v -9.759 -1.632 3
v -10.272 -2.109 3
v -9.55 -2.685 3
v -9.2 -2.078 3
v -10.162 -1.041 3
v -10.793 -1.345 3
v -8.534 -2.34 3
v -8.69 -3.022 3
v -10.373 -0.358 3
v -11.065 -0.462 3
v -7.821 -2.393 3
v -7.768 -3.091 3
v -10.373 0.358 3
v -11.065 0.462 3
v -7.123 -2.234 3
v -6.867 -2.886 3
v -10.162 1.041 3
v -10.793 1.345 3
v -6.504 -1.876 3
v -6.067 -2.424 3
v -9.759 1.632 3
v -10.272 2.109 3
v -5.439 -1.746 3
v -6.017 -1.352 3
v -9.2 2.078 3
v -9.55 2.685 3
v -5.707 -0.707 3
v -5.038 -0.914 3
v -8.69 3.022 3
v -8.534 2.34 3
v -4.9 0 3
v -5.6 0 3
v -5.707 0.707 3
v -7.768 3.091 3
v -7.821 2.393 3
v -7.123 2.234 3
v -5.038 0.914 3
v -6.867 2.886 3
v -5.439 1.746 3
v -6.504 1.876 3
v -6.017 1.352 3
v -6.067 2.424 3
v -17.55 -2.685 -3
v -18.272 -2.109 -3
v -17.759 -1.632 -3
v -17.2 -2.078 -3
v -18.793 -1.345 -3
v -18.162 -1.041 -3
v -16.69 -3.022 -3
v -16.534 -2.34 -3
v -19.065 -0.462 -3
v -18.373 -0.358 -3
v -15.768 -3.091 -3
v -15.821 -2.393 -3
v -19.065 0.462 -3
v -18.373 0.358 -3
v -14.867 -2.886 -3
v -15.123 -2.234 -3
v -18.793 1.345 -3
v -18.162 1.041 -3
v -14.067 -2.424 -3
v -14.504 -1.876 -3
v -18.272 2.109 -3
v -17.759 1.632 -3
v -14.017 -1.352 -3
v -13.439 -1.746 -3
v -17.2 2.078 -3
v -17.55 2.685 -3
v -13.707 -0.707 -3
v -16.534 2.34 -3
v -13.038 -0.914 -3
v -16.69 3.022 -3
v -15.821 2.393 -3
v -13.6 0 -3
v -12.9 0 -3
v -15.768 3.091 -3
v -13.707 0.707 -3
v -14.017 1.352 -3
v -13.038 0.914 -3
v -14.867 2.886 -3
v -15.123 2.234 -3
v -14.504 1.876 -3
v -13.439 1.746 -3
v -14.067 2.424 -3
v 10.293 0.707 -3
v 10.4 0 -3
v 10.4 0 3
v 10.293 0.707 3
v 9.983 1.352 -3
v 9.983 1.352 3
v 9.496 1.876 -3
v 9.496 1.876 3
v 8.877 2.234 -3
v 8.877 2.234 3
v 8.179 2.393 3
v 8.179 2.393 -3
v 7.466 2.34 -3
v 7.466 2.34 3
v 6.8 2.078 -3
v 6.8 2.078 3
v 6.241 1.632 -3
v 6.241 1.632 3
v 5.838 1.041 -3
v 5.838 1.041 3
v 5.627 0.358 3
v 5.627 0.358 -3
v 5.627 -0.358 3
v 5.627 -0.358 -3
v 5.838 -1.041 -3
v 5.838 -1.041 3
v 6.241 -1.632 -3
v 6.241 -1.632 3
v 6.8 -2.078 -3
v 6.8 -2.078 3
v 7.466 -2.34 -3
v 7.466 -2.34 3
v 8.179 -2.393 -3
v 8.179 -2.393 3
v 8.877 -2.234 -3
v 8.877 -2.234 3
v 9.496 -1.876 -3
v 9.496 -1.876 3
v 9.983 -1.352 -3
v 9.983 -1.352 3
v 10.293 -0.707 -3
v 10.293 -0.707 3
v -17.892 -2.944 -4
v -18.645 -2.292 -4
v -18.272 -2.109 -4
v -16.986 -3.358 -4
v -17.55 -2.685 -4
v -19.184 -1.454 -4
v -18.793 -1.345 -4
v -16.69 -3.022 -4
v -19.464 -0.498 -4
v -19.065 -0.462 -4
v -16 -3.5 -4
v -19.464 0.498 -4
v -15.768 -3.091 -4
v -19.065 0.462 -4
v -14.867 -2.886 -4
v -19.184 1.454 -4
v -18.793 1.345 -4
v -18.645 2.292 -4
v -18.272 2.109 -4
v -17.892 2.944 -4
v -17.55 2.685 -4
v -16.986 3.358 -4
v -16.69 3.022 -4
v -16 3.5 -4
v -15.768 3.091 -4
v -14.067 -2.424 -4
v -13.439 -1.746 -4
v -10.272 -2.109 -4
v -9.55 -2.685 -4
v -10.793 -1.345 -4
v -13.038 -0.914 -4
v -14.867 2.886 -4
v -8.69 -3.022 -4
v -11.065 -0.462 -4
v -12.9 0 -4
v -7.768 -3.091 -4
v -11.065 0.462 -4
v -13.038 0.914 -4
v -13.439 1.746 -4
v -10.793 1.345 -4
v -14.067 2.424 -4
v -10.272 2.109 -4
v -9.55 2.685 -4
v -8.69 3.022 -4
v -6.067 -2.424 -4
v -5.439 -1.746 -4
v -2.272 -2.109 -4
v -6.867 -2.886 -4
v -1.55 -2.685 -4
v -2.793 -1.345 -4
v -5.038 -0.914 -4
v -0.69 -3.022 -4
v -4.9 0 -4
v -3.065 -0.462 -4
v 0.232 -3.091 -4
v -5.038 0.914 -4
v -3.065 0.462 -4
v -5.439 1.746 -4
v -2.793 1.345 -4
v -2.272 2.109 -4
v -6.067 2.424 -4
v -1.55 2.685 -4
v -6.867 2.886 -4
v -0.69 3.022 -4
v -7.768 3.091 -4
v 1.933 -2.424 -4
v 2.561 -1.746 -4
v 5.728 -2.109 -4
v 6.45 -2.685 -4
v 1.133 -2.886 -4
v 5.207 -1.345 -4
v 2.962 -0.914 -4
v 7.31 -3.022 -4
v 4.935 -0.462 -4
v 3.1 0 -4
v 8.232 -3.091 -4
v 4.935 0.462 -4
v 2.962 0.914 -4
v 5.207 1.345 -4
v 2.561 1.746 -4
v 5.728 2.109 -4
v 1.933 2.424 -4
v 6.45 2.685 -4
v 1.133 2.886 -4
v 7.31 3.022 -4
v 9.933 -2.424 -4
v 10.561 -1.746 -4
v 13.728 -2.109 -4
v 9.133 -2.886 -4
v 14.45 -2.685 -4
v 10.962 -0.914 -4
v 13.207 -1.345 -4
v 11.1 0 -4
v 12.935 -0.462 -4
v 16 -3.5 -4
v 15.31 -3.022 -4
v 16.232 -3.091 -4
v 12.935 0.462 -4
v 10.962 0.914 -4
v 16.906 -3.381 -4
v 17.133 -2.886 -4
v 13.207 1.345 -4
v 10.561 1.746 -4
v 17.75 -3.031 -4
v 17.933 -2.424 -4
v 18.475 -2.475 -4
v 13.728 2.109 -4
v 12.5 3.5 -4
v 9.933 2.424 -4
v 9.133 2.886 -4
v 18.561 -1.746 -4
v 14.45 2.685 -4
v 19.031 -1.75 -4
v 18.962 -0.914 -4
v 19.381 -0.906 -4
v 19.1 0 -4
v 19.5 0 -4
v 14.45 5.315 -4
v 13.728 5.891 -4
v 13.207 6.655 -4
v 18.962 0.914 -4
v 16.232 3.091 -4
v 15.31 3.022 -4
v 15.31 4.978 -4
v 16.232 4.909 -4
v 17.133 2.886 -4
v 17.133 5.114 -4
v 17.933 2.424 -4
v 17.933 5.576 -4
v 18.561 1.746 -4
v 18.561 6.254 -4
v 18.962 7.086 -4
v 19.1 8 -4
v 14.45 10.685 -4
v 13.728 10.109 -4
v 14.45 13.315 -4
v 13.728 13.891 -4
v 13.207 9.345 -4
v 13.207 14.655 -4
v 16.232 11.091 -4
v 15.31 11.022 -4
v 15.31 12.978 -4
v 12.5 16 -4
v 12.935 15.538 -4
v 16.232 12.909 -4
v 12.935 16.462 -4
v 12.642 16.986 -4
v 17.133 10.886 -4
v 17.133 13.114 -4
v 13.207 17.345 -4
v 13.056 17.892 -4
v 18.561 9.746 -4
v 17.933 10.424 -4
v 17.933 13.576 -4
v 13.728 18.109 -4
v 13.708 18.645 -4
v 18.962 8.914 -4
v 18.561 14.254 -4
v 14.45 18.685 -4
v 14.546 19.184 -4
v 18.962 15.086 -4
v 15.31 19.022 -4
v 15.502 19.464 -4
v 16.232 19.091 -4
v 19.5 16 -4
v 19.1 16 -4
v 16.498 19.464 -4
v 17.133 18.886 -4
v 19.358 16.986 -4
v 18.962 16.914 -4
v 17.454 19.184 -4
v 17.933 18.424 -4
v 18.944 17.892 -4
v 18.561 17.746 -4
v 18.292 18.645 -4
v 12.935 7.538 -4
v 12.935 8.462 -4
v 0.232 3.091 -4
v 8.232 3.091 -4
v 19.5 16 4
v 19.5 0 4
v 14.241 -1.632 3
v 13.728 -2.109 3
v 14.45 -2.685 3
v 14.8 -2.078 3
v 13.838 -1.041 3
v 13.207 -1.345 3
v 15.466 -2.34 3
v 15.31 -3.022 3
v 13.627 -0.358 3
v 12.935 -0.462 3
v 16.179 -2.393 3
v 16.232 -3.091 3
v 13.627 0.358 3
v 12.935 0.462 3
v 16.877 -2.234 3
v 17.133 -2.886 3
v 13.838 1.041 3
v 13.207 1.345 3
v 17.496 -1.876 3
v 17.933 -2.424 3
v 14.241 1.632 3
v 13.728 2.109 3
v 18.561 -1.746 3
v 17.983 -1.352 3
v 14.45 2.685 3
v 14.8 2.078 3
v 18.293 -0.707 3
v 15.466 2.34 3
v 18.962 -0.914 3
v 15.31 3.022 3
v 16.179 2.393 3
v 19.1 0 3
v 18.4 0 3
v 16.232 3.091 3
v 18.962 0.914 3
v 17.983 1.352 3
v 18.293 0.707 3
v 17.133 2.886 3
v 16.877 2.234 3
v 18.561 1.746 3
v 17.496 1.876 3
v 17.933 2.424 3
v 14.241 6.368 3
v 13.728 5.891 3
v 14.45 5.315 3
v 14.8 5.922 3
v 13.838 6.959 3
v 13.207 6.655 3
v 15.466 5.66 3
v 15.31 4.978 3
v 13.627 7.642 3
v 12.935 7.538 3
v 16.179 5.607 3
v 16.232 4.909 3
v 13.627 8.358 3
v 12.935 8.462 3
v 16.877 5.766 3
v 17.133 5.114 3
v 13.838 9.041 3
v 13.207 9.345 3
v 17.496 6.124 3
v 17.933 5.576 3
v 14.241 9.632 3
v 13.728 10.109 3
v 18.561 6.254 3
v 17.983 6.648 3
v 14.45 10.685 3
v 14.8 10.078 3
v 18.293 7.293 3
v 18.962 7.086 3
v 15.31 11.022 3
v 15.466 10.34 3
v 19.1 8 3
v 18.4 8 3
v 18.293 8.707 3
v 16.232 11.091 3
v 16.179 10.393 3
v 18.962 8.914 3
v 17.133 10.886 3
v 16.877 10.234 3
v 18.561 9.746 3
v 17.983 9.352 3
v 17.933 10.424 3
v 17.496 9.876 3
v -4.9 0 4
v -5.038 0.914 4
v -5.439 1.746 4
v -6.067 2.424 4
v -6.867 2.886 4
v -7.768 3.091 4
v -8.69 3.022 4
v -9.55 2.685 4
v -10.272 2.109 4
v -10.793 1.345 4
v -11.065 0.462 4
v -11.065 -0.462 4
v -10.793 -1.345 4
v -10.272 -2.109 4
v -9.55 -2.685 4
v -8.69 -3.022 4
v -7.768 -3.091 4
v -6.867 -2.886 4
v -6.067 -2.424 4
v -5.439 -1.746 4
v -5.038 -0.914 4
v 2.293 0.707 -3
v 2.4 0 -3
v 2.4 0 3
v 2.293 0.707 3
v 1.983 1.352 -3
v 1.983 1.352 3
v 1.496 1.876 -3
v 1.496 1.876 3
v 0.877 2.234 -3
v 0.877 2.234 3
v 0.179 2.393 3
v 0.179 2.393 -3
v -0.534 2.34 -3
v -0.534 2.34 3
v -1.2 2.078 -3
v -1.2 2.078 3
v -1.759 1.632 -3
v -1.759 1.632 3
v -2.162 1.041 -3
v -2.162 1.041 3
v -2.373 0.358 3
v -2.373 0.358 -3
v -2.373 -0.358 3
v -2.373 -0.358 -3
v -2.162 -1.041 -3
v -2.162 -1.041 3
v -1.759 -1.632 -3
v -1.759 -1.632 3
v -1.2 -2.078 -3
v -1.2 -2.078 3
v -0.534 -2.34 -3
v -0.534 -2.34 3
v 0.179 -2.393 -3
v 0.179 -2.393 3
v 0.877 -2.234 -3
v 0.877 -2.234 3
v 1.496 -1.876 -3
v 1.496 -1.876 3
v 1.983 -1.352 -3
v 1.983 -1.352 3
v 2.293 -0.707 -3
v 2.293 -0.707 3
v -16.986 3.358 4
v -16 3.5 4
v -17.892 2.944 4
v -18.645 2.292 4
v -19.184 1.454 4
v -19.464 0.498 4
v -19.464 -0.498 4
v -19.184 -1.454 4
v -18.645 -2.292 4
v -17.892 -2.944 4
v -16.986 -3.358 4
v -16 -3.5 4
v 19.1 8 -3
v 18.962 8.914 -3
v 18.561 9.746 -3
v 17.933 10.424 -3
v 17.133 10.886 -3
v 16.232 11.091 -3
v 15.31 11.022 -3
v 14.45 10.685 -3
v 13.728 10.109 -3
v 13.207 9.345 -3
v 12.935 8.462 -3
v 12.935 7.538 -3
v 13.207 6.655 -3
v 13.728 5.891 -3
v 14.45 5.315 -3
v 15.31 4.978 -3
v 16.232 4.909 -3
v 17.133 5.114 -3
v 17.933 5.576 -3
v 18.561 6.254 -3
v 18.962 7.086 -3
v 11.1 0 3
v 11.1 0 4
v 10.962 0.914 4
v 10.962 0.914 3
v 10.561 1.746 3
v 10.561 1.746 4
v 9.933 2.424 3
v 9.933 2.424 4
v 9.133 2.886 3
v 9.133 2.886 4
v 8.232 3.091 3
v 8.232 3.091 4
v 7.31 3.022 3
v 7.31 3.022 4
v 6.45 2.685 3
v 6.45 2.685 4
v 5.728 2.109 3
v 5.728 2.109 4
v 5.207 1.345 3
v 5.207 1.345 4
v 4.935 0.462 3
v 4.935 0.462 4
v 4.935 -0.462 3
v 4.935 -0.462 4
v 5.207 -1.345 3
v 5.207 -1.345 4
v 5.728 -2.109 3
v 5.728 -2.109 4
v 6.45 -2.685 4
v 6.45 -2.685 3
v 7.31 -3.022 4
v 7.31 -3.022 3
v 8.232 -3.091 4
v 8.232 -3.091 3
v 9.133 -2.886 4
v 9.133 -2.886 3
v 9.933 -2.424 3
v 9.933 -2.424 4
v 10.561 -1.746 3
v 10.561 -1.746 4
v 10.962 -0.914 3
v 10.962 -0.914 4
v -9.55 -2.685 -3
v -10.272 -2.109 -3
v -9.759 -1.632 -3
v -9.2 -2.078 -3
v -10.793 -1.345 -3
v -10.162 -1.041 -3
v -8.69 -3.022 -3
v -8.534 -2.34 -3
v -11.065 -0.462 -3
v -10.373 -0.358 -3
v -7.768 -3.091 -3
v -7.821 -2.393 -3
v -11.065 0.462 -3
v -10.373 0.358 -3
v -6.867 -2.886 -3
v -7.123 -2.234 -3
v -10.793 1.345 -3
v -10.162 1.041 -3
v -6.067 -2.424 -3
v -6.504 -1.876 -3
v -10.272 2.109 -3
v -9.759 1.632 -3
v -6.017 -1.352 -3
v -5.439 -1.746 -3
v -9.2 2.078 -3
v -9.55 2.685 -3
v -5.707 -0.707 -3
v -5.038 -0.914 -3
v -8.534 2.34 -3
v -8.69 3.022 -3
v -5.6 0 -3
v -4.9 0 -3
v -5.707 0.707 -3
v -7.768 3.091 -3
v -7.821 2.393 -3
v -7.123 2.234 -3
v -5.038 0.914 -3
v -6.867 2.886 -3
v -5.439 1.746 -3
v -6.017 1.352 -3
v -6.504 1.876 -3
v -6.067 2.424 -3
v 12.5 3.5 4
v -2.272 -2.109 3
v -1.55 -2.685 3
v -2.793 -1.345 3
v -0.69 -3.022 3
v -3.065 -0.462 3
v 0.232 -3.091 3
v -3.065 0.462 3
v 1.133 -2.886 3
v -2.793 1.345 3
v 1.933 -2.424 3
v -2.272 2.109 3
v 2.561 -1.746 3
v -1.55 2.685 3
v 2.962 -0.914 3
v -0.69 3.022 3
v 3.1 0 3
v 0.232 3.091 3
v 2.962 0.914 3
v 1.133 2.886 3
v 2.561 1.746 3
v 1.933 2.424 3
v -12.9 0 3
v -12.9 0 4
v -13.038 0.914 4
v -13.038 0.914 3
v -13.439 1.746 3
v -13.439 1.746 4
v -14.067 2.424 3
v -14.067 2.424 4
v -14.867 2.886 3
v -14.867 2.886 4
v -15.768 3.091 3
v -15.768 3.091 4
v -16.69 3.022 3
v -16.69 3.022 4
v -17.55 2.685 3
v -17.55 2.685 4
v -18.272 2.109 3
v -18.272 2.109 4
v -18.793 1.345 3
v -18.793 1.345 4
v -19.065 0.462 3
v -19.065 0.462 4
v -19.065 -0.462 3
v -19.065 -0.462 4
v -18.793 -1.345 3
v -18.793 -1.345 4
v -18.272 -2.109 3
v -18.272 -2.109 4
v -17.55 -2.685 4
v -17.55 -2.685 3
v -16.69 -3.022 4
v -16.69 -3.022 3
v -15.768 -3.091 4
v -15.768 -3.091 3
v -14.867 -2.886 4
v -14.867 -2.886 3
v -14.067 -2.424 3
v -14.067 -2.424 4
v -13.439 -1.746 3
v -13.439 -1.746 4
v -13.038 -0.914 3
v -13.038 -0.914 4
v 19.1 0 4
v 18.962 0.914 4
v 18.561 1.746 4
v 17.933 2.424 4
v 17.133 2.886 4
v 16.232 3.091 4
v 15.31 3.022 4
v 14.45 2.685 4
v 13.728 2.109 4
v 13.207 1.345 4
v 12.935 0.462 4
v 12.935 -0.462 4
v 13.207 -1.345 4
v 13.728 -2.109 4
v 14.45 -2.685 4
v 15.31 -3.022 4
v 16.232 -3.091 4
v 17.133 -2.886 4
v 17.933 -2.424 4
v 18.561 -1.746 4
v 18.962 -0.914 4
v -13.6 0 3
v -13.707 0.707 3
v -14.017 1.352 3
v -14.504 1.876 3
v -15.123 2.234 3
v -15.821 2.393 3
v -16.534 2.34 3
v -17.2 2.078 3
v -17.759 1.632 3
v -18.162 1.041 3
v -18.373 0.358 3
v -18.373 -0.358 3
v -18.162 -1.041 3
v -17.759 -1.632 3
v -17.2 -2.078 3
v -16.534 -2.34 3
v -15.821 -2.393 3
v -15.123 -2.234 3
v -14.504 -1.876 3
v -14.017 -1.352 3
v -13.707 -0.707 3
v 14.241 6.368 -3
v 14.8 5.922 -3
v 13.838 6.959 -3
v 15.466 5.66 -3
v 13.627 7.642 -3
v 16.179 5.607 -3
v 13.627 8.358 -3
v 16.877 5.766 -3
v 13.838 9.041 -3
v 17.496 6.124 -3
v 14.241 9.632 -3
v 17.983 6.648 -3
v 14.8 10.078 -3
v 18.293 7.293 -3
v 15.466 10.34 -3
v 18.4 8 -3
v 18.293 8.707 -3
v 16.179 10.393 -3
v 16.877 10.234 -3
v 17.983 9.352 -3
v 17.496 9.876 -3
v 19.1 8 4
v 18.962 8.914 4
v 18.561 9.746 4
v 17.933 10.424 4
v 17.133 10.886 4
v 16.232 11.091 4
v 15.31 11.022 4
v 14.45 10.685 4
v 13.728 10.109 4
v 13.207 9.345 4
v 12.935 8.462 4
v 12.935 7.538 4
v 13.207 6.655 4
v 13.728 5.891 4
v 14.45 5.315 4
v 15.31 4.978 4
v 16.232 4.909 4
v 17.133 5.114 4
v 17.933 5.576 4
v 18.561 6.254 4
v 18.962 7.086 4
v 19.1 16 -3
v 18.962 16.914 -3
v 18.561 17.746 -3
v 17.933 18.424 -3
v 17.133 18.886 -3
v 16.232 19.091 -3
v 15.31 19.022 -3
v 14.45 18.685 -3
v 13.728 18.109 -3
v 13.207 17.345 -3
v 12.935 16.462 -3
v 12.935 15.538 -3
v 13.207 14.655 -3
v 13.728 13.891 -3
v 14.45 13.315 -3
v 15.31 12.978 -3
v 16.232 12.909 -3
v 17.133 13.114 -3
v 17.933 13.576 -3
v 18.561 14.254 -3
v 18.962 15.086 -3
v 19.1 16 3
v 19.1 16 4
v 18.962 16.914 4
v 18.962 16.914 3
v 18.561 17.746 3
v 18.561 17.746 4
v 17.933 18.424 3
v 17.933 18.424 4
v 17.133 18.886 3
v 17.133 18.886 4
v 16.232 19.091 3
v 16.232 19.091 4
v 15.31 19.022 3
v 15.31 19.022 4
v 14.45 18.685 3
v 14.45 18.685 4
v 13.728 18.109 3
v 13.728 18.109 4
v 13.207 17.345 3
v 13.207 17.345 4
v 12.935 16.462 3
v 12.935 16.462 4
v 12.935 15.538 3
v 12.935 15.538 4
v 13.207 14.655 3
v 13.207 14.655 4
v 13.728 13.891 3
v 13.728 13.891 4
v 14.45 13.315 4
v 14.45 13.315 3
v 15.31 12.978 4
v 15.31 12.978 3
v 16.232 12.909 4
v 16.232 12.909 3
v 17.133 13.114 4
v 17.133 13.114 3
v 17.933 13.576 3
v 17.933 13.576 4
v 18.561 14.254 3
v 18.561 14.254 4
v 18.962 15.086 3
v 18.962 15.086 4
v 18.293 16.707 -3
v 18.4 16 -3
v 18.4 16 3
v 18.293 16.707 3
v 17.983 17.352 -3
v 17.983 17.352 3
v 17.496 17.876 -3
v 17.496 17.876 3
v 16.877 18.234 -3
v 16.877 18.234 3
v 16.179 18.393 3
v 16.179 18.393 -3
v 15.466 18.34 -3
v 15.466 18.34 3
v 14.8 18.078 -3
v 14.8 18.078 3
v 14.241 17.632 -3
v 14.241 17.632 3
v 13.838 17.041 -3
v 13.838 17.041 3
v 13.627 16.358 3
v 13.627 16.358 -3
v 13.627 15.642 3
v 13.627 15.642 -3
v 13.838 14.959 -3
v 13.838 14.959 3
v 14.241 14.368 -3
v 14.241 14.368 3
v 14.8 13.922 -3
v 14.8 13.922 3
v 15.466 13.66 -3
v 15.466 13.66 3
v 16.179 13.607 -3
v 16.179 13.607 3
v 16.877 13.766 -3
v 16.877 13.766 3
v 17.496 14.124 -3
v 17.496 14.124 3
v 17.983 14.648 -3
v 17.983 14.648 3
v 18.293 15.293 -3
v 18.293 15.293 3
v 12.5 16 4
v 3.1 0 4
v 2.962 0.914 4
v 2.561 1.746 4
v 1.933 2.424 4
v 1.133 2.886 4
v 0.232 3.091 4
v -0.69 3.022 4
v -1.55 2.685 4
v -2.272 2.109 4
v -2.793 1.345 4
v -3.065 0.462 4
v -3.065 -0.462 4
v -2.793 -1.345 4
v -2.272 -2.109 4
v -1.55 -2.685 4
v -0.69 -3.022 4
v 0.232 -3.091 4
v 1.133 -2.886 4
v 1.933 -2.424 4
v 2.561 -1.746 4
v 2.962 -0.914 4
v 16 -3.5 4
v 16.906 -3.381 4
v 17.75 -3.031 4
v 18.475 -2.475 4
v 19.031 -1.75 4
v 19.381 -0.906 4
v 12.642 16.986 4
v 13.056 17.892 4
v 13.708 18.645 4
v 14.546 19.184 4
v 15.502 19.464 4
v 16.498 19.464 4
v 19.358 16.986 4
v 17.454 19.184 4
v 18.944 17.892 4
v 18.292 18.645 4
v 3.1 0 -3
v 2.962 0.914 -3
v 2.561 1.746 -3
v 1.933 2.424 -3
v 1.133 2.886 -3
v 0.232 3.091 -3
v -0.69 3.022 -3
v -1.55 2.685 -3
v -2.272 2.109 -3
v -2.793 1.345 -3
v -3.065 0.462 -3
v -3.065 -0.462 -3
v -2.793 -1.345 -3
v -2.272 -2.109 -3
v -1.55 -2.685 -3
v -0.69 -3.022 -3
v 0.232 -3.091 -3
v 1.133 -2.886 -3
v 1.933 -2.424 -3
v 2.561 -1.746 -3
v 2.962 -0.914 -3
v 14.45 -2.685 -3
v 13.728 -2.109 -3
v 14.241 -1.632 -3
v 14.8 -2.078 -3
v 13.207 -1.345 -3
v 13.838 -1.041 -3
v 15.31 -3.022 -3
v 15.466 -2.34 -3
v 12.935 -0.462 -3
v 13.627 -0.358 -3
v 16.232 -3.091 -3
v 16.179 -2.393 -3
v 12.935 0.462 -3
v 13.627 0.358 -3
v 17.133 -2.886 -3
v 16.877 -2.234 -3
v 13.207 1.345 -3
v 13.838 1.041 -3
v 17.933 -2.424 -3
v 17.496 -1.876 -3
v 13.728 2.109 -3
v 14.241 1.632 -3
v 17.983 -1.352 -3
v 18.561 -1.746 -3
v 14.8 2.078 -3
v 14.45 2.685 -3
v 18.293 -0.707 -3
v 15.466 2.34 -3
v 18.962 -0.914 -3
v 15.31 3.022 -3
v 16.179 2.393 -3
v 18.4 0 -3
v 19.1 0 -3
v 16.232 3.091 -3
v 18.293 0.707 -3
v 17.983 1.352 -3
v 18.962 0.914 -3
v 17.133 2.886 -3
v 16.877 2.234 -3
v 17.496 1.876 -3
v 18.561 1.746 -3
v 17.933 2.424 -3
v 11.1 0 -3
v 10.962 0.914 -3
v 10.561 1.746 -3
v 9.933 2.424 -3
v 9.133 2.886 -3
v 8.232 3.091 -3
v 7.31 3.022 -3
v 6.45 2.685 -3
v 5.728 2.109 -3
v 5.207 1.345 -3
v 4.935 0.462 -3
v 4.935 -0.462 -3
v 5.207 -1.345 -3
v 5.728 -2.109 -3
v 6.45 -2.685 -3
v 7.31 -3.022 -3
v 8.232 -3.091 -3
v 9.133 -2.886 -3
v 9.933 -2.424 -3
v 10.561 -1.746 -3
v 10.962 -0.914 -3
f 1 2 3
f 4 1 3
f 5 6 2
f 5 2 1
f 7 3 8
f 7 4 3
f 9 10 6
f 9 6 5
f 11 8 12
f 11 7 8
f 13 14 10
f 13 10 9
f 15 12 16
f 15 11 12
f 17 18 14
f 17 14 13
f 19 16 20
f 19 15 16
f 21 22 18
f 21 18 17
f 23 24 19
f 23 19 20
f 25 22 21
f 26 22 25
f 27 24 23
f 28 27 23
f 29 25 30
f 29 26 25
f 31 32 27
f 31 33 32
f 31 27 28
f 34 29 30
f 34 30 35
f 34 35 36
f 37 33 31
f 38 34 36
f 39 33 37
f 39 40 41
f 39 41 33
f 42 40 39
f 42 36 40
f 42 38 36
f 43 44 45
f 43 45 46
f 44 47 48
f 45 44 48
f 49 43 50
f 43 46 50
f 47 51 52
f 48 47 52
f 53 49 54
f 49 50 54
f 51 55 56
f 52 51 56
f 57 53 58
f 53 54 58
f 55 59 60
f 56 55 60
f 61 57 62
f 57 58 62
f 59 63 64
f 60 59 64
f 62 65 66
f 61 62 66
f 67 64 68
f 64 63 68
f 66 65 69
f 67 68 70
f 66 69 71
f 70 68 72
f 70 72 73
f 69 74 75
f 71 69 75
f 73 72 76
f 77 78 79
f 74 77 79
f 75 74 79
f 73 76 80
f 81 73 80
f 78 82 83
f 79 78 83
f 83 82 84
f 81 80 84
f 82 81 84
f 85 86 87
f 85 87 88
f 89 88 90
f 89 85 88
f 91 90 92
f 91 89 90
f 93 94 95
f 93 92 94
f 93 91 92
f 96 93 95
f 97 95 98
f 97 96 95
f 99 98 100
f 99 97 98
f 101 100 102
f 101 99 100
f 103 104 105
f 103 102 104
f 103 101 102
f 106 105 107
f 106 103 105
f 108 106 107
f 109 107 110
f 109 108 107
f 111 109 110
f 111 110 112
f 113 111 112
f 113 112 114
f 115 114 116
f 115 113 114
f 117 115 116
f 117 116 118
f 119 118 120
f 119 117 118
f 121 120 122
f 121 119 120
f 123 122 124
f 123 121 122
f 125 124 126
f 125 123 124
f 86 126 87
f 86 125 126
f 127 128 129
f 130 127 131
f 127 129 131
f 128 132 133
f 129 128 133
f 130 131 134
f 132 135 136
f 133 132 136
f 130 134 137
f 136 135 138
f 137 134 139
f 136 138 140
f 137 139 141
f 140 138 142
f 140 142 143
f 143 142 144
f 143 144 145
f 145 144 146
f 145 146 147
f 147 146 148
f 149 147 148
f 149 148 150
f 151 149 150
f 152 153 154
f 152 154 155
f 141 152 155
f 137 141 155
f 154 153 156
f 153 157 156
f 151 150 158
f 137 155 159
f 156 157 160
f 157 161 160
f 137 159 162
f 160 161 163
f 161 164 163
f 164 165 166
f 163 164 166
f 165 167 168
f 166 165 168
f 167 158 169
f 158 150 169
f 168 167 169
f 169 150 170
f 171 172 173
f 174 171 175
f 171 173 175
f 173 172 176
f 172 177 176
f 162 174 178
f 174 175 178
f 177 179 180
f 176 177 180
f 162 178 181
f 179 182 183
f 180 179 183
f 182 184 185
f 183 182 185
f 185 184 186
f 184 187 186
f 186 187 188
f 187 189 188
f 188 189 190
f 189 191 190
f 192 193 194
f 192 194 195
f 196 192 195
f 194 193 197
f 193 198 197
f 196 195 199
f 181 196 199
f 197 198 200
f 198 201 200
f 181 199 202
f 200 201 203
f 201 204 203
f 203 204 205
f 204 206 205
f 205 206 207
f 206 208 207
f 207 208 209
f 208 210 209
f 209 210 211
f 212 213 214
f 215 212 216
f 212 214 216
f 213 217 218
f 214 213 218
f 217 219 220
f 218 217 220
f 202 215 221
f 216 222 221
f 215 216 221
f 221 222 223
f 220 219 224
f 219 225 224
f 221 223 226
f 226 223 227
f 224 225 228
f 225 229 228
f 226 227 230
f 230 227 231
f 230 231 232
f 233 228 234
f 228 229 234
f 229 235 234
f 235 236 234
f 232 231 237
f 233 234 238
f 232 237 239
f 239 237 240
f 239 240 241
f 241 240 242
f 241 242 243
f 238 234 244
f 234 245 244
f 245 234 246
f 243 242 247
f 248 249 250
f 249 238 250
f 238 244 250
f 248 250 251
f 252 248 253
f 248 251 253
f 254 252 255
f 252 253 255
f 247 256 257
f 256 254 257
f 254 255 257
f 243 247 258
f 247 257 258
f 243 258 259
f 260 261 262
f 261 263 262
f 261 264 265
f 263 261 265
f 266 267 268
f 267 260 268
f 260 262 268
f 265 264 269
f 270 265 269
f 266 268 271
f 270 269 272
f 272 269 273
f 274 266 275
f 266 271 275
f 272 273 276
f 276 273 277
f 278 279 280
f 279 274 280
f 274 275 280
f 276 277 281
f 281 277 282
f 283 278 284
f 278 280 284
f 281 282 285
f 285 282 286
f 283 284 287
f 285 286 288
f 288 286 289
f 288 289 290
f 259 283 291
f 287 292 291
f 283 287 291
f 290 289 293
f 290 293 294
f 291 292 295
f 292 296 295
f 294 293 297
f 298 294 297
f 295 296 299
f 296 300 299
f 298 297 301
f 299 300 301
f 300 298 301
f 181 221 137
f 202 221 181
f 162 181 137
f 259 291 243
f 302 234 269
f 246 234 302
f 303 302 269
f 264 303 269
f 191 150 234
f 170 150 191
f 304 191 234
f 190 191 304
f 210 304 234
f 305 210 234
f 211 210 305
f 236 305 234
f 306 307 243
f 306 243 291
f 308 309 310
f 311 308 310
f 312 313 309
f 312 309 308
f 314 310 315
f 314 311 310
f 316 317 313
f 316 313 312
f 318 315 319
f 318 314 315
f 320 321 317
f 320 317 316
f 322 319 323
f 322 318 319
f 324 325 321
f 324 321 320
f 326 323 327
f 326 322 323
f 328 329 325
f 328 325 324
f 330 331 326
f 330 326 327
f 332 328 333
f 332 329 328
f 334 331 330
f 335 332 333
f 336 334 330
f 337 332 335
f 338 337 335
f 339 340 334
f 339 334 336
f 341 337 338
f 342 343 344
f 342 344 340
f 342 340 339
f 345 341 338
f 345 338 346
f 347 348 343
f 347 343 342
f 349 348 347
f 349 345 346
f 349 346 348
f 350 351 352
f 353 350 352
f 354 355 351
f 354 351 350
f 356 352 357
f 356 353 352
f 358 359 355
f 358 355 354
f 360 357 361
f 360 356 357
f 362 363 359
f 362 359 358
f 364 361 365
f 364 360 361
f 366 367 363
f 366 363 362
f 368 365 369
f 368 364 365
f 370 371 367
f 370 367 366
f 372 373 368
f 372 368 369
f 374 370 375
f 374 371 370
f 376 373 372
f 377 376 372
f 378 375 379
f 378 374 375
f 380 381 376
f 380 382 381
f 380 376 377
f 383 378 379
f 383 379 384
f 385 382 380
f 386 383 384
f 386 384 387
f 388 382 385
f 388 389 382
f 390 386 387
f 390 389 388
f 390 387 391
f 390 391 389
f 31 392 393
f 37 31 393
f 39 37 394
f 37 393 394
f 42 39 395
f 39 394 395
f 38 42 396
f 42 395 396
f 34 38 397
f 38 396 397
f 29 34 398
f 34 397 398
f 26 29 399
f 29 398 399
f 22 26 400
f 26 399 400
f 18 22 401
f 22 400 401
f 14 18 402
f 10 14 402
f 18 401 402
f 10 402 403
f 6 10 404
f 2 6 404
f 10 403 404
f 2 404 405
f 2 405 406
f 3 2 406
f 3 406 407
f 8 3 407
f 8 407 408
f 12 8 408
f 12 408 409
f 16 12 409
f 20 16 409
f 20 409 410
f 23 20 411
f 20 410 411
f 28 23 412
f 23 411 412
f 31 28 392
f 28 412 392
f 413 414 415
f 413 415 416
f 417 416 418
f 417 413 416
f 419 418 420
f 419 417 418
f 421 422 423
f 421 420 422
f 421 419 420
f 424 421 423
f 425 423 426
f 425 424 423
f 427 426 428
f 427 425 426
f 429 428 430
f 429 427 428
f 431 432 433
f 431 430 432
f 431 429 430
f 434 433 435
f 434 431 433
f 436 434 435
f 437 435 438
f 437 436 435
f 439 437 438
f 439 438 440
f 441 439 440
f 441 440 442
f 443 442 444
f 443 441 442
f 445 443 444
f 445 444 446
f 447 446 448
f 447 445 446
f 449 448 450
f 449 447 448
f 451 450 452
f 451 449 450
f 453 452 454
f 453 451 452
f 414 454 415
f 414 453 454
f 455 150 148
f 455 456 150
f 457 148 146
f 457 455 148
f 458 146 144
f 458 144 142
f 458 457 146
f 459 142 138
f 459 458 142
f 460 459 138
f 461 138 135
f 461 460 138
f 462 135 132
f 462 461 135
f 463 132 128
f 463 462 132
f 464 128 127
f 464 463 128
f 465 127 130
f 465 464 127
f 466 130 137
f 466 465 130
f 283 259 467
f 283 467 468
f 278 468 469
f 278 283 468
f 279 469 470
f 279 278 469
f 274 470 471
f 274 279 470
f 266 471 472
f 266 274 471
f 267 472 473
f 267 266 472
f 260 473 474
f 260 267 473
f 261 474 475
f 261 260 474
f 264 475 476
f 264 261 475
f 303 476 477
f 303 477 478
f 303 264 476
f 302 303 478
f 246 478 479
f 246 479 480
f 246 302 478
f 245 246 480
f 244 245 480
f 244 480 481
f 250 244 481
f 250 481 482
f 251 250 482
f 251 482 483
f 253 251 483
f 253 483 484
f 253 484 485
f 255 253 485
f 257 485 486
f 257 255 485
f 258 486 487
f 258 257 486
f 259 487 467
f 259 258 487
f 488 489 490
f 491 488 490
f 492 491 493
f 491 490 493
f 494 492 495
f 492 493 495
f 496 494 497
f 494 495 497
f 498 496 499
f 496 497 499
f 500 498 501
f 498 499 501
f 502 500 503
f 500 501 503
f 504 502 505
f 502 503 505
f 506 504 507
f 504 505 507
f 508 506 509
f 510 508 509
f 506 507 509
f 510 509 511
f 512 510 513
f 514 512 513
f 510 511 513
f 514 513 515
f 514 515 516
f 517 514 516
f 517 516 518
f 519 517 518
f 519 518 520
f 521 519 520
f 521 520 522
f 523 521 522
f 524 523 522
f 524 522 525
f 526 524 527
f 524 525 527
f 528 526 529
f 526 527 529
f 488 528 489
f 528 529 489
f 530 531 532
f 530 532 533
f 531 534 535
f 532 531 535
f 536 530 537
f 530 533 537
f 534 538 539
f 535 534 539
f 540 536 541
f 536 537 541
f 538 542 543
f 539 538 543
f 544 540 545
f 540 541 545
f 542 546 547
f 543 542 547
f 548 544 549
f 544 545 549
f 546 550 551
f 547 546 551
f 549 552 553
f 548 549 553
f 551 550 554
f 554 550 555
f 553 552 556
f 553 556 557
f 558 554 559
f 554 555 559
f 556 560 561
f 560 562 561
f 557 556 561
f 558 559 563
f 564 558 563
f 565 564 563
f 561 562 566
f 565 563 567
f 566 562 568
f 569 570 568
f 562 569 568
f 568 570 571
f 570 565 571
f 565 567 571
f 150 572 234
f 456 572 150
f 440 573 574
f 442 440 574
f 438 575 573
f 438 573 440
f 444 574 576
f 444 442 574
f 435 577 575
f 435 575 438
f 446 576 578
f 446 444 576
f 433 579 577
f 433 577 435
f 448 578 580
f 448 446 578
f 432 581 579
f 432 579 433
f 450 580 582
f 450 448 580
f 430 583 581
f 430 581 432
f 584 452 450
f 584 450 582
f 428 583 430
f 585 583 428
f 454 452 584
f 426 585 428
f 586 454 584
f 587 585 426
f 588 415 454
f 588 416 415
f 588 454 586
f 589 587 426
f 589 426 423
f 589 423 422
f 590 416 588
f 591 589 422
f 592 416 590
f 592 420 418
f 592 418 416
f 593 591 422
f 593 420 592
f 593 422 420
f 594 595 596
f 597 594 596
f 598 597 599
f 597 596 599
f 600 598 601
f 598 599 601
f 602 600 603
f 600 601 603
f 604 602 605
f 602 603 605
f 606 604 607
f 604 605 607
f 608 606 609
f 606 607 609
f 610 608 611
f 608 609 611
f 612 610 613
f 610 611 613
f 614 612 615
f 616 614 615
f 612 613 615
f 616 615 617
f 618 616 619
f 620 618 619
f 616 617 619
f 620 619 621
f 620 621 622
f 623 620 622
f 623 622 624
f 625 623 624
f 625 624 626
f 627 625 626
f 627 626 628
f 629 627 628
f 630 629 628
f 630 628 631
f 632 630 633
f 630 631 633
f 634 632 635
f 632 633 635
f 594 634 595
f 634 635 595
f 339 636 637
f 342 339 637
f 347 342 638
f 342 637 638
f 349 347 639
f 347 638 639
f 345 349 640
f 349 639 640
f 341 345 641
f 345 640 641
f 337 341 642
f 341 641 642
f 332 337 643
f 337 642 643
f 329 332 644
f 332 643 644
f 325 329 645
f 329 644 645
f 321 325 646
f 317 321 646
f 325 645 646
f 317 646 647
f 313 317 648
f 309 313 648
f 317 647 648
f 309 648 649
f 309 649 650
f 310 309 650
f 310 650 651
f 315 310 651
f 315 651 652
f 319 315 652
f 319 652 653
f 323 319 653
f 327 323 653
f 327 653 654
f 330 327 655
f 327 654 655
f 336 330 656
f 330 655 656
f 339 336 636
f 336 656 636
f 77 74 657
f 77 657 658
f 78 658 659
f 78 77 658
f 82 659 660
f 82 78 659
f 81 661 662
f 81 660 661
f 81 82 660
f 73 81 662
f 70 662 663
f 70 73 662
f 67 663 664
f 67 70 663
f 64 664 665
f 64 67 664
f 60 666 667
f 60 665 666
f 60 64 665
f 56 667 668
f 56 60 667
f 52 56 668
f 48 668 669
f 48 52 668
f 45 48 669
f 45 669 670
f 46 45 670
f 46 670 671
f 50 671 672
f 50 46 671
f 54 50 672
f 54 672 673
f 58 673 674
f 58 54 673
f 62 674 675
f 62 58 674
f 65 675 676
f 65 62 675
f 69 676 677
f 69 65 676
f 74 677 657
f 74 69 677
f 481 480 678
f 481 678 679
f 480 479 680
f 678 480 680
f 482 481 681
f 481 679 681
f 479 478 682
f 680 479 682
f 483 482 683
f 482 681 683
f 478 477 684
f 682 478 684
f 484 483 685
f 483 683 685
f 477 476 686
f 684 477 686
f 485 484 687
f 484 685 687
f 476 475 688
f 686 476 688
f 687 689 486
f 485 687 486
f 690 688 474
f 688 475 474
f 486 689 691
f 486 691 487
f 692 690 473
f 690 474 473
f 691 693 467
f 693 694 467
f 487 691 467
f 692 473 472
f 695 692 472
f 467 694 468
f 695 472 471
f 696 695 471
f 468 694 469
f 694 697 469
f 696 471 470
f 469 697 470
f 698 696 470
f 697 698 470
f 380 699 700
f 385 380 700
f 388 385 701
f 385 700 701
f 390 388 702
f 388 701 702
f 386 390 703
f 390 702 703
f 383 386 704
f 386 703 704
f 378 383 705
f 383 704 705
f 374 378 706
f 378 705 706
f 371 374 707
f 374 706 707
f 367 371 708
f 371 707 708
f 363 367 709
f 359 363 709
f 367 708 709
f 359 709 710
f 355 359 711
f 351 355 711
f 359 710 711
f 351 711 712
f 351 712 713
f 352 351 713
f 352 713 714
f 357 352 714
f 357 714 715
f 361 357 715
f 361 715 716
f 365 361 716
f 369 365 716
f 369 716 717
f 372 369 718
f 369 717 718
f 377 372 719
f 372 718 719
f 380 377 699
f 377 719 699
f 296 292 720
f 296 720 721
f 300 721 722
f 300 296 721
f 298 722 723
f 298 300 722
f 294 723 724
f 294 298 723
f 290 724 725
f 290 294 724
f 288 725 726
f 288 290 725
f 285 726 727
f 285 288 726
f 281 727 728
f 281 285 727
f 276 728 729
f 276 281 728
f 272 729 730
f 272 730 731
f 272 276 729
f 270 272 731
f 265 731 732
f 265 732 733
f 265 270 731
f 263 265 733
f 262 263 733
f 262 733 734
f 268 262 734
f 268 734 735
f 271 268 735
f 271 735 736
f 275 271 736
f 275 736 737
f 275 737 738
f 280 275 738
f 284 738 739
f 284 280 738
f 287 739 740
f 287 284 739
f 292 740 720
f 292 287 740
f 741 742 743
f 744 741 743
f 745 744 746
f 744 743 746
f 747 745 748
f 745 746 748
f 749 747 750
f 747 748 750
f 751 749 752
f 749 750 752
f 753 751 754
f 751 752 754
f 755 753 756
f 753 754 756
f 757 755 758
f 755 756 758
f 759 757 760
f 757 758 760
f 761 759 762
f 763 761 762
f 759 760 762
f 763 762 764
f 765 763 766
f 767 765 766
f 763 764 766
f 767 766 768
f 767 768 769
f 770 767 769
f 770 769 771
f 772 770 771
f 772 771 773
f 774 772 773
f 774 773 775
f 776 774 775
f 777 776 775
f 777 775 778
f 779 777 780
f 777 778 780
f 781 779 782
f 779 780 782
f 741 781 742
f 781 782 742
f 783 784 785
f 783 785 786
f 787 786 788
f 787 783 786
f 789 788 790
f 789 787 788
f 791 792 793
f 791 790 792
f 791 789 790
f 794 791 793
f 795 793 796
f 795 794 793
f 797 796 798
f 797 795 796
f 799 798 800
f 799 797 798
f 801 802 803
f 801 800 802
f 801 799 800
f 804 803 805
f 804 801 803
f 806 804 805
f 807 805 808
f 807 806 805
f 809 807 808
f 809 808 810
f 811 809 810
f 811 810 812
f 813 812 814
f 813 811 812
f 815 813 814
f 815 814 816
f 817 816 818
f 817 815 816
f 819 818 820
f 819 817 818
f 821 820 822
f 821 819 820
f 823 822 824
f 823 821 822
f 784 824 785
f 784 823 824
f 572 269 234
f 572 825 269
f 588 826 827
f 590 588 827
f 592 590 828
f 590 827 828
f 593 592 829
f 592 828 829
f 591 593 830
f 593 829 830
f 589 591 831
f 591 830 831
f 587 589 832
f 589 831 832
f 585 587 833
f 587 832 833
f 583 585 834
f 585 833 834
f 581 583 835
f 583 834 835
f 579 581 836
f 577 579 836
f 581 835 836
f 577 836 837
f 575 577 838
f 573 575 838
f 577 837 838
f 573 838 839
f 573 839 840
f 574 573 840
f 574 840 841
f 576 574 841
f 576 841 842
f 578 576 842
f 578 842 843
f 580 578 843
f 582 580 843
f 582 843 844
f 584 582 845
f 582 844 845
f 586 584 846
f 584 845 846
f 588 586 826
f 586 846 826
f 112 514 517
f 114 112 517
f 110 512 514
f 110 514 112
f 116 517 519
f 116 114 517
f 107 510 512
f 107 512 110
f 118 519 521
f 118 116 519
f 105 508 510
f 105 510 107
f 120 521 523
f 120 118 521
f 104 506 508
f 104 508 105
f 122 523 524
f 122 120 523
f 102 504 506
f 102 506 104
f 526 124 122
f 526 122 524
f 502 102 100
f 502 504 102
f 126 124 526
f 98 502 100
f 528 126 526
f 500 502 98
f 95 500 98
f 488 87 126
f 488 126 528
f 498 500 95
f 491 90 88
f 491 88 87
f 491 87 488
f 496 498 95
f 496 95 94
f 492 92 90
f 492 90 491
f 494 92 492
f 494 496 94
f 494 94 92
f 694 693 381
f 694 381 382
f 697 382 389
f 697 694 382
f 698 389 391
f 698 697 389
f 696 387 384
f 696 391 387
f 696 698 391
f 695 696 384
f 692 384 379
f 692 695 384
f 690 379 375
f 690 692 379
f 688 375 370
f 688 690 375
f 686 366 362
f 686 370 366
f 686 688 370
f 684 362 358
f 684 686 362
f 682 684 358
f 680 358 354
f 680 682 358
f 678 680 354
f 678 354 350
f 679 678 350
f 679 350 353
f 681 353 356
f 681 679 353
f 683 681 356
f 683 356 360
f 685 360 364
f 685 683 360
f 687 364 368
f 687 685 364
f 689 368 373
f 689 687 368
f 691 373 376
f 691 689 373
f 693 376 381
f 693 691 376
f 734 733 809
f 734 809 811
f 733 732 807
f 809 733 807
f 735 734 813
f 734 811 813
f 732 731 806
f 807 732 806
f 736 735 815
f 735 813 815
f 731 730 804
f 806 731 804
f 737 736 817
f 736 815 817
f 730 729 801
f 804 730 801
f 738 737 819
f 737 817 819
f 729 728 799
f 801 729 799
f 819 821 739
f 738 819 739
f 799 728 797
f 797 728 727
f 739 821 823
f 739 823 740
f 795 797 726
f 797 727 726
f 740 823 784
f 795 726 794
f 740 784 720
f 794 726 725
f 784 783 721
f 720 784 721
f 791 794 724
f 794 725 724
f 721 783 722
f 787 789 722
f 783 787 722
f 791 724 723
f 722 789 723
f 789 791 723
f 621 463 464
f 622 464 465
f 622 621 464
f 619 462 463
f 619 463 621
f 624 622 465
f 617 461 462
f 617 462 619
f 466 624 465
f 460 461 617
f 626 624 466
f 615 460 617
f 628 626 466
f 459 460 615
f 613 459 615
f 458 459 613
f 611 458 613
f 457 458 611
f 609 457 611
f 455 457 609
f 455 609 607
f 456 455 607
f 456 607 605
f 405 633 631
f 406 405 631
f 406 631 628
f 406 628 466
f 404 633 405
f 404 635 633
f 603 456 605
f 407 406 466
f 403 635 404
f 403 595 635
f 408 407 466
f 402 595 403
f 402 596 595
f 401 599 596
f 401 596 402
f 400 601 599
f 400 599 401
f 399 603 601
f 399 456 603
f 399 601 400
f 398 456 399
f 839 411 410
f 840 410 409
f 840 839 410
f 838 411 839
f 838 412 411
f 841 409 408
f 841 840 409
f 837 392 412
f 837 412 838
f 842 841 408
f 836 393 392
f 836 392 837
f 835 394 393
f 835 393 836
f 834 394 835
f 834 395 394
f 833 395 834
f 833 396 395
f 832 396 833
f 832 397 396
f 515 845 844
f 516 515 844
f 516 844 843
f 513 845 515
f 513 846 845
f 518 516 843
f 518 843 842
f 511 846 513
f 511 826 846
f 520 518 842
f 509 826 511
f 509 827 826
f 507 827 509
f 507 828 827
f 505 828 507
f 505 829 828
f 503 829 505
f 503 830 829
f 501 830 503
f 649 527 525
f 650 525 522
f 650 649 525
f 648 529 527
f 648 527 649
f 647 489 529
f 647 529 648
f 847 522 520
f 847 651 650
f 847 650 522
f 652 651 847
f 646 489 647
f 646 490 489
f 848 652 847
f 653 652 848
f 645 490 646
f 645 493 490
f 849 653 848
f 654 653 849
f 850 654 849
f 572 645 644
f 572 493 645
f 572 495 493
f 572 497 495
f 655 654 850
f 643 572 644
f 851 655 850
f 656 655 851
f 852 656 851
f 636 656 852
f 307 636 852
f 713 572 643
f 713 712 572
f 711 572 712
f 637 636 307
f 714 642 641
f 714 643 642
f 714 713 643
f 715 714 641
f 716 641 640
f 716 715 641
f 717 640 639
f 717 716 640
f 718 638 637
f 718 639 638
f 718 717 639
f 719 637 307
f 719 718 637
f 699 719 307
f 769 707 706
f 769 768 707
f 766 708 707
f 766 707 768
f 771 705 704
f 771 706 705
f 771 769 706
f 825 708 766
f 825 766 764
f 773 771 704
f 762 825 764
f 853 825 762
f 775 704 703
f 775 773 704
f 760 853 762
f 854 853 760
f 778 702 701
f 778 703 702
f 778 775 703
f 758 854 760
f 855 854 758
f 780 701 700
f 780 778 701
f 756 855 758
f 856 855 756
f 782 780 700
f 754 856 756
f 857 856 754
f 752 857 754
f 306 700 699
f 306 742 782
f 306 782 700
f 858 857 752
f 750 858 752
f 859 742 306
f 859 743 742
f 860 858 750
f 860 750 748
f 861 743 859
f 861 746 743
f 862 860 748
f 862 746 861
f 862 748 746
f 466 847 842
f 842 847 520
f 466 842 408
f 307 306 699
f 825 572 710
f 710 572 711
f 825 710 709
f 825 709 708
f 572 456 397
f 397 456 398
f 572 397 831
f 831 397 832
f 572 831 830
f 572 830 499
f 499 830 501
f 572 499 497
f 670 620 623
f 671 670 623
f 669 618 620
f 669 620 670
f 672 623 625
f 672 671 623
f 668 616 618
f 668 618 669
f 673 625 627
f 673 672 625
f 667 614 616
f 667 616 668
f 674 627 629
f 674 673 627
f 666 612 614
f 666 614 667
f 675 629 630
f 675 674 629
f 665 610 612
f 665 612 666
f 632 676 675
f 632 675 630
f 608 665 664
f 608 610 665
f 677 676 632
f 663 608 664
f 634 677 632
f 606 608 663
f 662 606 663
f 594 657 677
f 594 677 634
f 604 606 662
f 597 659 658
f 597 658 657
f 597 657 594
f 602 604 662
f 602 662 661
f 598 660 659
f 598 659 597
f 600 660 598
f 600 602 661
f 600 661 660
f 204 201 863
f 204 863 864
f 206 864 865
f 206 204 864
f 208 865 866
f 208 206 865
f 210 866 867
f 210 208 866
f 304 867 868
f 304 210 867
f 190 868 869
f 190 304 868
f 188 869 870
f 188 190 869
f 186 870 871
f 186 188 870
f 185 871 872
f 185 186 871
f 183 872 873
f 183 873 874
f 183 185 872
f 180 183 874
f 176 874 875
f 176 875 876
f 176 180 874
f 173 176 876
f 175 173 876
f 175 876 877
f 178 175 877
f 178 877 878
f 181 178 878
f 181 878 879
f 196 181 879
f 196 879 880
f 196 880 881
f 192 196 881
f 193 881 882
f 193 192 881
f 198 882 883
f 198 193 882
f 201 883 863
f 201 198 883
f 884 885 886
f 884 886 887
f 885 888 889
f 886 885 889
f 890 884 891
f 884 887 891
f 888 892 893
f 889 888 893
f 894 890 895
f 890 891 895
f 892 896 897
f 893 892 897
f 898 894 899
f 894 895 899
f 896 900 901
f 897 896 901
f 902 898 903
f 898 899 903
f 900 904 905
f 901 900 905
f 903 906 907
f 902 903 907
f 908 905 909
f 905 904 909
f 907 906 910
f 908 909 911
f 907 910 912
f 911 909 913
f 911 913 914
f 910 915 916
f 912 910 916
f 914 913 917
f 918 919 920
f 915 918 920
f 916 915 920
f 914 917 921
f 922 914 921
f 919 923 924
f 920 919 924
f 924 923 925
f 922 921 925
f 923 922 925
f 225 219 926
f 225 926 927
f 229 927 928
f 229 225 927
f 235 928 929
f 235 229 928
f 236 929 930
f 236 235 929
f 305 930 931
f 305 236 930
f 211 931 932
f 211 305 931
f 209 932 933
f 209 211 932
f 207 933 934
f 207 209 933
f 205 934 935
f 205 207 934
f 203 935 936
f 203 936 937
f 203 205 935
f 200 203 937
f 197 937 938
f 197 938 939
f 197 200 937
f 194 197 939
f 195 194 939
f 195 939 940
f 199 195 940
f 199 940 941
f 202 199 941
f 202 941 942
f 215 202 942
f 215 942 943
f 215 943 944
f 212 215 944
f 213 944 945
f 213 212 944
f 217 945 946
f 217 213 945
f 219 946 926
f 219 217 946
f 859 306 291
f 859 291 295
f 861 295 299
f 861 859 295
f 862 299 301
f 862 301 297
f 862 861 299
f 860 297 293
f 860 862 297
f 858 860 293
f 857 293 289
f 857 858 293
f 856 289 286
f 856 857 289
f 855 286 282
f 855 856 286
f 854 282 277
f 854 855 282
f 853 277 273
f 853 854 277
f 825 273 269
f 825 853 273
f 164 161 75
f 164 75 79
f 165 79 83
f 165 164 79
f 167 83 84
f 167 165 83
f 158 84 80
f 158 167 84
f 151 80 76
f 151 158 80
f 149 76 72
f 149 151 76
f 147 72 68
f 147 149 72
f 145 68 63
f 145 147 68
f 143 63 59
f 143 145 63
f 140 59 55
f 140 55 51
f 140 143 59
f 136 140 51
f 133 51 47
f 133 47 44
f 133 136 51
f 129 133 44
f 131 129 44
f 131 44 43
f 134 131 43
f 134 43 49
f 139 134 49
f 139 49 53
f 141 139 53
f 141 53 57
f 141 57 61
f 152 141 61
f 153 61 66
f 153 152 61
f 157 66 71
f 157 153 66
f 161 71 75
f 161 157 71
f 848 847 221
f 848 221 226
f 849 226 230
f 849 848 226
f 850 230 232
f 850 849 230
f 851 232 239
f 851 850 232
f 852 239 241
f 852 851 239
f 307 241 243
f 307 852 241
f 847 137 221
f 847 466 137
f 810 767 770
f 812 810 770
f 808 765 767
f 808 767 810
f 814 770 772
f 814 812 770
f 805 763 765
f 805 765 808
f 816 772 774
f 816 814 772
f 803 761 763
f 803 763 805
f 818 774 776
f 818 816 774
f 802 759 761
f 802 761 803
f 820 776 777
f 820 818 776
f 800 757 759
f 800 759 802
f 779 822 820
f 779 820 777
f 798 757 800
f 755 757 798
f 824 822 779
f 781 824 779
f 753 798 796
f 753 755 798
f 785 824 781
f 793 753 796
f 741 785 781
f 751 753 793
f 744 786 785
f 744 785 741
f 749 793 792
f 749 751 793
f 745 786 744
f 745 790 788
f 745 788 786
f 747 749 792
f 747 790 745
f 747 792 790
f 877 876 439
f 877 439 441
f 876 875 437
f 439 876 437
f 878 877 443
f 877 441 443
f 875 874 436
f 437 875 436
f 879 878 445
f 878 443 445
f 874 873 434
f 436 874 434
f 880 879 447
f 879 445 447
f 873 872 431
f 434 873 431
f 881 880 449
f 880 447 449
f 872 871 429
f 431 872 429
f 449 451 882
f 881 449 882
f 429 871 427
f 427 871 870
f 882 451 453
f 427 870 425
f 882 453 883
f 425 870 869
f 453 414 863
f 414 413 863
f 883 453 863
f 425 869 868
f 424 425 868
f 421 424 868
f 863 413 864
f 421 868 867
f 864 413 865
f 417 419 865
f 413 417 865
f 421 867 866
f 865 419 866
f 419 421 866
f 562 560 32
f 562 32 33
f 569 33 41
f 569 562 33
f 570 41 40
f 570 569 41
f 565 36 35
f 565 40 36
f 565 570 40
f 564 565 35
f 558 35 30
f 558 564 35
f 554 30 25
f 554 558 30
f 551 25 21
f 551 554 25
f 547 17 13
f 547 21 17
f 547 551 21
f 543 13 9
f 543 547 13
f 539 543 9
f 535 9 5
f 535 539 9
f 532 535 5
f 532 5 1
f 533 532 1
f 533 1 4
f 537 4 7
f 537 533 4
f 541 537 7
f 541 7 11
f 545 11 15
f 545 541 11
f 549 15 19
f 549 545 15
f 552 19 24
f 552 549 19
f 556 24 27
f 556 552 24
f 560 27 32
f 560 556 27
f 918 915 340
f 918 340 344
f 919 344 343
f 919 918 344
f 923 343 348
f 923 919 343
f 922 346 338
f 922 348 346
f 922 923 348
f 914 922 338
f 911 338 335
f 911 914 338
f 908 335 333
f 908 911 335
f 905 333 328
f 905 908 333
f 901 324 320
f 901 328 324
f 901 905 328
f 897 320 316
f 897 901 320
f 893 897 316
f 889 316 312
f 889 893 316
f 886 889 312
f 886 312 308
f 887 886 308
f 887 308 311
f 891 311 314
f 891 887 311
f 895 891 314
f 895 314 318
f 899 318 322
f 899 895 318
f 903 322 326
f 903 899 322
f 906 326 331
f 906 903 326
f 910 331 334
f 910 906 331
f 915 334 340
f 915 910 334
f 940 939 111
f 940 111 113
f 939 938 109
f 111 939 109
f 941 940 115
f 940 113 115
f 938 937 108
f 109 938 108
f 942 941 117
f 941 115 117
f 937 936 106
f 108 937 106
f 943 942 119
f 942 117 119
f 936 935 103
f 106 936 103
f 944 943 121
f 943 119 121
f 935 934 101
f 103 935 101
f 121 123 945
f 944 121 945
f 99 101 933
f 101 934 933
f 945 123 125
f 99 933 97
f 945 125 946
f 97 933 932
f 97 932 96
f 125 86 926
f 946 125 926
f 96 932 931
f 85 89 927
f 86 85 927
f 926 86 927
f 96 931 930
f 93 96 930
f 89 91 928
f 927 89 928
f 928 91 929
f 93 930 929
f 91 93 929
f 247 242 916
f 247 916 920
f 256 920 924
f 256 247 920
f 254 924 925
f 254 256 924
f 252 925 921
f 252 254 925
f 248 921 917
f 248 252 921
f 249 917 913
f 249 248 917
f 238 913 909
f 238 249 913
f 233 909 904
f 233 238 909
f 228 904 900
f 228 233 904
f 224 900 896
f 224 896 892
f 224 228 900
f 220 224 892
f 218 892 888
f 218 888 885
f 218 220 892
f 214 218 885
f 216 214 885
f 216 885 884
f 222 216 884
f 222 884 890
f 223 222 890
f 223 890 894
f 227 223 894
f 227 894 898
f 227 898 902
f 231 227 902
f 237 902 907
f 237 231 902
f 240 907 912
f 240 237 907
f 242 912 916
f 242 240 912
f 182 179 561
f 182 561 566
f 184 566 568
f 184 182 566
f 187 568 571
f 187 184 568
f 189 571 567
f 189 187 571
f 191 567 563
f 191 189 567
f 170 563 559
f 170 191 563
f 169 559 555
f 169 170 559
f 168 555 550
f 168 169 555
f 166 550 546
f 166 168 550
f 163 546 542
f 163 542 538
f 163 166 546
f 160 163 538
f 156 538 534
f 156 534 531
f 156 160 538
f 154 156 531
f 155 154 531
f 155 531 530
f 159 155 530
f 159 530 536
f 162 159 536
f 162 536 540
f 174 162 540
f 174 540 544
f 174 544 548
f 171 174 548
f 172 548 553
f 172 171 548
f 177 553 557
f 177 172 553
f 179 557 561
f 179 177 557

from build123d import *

# Parameters (mm, degrees)
SKETCH1_R           = 2.4
BOSS_EXTRUDE1_DEPTH = 4
SKETCH2_R           = 3.1
CUT_EXTRUDE1_DEPTH  = 1


with BuildPart() as part:
    # Sketch1 → Boss-Extrude1 (new, symmetric)
    with BuildSketch(Plane.XY):
        with BuildLine():
            Line((-16, -3.5), (16, -3.5))
            ThreePointArc((16, -3.5), (18.474873734, -2.474873734), (19.5, 0))
            Line((19.5, 0), (19.5, 16))
            ThreePointArc((19.5, 16), (16, 19.5), (12.5, 16))
            Line((12.5, 16), (12.5, 3.5))
            Line((12.5, 3.5), (-16, 3.5))
            ThreePointArc((-16, 3.5), (-19.5, 0), (-16, -3.5))
        make_face()
        Circle(SKETCH1_R, mode=Mode.SUBTRACT)
        with Locations((8, 0)):
            Circle(SKETCH1_R, mode=Mode.SUBTRACT)
        with Locations((16, 0)):
            Circle(SKETCH1_R, mode=Mode.SUBTRACT)
        with Locations((-8, 0)):
            Circle(SKETCH1_R, mode=Mode.SUBTRACT)
        with Locations((-16, 0)):
            Circle(SKETCH1_R, mode=Mode.SUBTRACT)
        with Locations((16, 8)):
            Circle(SKETCH1_R, mode=Mode.SUBTRACT)
        with Locations((16, 16)):
            Circle(SKETCH1_R, mode=Mode.SUBTRACT)
    extrude(amount=BOSS_EXTRUDE1_DEPTH, both=True)

    # Sketch2 → Cut-Extrude1 (cut)
    with BuildSketch(Plane.XY.offset(4)):
        with Locations((-16, 0)):
            Circle(SKETCH2_R)
        with Locations((-8, 0)):
            Circle(SKETCH2_R)
        Circle(SKETCH2_R)
        with Locations((8, 0)):
            Circle(SKETCH2_R)
        with Locations((16, 0)):
            Circle(SKETCH2_R)
        with Locations((16, 8)):
            Circle(SKETCH2_R)
        with Locations((16, 16)):
            Circle(SKETCH2_R)
    cut_extrude1 = extrude(amount=-CUT_EXTRUDE1_DEPTH, mode=Mode.SUBTRACT)

    # Mirror1: Cut-Extrude1 across plane
    add(cut_extrude1.mirror(Plane.XY), mode=Mode.SUBTRACT)


solid = part.part
